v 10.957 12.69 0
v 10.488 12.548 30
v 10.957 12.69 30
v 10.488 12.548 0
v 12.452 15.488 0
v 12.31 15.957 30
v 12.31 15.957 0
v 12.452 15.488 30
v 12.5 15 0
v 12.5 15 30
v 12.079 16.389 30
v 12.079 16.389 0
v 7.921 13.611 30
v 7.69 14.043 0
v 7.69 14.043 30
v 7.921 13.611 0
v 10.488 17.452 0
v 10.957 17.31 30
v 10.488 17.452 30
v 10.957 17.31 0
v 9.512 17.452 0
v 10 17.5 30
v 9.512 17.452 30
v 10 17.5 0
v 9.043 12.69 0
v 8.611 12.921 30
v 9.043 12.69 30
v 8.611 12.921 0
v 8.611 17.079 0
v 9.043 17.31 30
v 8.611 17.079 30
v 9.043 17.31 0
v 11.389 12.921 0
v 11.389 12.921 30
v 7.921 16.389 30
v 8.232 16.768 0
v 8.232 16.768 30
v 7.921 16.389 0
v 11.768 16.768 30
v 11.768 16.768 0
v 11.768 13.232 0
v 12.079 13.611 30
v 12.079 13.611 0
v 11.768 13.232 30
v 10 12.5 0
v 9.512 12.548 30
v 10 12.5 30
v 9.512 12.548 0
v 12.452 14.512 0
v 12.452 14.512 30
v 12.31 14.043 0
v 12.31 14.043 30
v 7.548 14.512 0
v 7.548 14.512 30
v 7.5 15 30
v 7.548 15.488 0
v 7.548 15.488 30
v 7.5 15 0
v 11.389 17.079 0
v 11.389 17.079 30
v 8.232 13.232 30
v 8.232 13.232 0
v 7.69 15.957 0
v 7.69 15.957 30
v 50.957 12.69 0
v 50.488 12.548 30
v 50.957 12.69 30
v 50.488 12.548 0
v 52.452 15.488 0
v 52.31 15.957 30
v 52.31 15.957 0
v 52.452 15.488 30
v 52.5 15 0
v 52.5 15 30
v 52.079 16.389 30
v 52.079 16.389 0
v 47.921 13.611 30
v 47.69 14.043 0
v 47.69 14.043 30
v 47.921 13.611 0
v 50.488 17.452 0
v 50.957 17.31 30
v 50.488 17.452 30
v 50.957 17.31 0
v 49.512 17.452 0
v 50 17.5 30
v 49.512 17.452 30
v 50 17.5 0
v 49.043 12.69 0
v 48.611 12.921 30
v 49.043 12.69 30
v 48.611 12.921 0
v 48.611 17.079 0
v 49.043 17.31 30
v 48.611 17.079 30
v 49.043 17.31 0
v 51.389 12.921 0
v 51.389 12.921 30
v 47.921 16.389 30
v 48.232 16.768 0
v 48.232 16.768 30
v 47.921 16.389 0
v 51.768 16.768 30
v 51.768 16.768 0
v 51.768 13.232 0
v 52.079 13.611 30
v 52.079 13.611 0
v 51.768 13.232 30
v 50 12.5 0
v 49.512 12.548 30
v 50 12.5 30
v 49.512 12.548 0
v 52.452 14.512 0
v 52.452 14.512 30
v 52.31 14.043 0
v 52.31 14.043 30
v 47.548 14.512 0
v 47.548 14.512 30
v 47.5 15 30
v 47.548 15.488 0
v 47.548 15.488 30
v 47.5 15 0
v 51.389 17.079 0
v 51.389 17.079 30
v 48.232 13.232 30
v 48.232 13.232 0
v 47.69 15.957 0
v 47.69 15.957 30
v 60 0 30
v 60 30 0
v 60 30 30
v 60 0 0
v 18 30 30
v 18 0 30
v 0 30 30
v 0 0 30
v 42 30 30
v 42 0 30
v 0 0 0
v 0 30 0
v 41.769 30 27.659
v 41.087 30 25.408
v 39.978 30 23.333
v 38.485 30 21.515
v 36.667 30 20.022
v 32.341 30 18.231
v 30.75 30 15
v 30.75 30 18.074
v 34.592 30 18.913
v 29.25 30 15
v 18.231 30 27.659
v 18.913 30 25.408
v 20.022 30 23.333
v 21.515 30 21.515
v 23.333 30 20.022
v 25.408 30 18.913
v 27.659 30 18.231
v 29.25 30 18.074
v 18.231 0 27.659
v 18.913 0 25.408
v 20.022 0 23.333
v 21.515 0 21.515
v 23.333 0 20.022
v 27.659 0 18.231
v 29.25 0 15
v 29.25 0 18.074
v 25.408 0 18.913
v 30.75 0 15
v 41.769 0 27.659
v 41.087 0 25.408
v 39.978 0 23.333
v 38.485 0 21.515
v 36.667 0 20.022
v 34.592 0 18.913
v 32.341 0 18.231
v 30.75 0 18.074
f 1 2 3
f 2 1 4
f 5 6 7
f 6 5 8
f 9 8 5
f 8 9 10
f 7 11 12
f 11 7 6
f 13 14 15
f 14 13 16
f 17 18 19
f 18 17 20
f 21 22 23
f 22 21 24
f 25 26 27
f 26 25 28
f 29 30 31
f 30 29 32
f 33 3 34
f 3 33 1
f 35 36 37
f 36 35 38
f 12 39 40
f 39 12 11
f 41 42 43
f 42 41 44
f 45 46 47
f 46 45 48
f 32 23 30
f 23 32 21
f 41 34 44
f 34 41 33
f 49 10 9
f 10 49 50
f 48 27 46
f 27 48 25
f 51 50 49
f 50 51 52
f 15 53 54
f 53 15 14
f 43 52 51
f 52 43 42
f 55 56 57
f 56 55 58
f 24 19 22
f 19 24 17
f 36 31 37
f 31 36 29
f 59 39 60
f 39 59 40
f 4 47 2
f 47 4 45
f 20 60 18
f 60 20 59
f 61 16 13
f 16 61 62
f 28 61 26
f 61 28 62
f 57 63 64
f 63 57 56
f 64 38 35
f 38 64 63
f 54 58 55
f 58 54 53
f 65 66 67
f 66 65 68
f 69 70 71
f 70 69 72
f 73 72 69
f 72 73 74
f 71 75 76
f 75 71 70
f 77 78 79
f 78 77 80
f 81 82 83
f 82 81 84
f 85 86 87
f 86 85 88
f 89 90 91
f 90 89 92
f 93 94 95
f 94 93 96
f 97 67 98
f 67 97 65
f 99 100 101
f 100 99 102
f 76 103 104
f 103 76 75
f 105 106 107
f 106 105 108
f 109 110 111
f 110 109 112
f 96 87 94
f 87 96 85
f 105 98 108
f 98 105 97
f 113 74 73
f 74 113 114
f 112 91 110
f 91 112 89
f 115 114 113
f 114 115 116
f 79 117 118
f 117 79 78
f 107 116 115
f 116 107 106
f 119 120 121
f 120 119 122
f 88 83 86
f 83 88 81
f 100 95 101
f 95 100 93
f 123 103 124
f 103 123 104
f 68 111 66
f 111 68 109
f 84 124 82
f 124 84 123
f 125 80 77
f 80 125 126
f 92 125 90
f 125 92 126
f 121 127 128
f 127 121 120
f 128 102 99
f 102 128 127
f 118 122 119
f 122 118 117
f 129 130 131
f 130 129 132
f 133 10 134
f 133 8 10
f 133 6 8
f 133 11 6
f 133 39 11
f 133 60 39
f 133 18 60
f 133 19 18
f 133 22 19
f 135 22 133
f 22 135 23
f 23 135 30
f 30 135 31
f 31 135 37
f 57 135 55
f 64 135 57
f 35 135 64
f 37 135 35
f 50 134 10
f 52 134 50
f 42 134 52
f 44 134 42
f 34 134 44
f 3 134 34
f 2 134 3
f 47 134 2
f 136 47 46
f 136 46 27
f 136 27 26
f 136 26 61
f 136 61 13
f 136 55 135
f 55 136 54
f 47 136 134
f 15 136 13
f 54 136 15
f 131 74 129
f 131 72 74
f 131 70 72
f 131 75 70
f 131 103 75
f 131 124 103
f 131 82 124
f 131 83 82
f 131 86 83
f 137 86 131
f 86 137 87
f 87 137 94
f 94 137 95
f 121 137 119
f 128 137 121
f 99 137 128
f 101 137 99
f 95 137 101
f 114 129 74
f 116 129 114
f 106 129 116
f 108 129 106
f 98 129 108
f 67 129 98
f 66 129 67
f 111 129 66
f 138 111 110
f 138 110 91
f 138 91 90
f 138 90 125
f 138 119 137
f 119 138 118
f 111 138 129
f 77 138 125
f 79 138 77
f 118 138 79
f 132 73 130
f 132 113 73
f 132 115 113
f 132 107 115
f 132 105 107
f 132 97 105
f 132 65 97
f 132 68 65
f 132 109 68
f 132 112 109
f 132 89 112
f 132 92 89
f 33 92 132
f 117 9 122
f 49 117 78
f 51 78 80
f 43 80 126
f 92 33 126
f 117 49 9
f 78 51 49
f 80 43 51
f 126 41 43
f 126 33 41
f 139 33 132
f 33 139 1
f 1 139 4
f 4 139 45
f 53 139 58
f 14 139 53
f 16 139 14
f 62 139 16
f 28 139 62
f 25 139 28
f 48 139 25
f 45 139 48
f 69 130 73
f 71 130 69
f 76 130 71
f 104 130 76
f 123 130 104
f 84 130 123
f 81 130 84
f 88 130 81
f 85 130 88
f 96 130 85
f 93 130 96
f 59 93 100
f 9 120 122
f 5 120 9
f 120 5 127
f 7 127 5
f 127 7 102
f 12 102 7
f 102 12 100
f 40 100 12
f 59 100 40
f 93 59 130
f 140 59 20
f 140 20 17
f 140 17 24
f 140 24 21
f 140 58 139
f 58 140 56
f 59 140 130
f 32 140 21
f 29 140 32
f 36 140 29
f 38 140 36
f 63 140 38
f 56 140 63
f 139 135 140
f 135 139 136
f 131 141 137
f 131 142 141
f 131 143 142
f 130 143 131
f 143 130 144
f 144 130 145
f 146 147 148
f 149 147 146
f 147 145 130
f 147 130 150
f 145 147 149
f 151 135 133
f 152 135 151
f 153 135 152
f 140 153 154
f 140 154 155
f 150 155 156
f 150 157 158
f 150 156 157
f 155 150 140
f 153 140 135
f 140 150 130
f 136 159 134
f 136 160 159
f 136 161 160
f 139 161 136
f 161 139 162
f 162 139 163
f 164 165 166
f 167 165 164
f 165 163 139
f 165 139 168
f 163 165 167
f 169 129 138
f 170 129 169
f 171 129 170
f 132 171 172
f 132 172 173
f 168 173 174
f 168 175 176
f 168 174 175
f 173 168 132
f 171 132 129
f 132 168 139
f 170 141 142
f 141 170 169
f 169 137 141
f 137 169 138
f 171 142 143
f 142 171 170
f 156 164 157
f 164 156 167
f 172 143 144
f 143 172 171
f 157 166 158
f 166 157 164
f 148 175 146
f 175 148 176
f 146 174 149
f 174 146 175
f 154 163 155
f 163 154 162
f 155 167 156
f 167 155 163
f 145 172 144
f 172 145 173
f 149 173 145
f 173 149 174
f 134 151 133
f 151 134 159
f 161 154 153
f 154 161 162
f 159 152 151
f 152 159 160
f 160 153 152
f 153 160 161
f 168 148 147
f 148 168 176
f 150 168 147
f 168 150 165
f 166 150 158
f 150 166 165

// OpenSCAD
$fn = 32;

// ----------------------------------------------------------------------
// Saddle clamp: split shaft clamp
// ----------------------------------------------------------------------

// --- parameters (mm) ---
blk_l = 60;               // block length, X
blk_w = 30;               // block width, Y
blk_h = 30;               // block height
clamp_r = 12;             // shaft groove radius
hole_r = 2.5;             // bolt hole radius
hole_m = 10;              // bolt hole margin from the ends
saw_w = 1.5;              // saw kerf width

saw_depth = clamp_r + 3;  // saw kerf depth

difference() {
  cube([blk_l, blk_w, blk_h]);
  translate([blk_l / 2, -1, blk_h])
    rotate([-90, 0, 0])
      cylinder(h = blk_w + 2, r = clamp_r);
  for (sx = [0, 1])
    translate([sx ? blk_l - hole_m : hole_m, blk_w / 2, -1])
      cylinder(r = hole_r, h = blk_h + 2);
  translate([blk_l / 2 - saw_w / 2, -1, blk_h - saw_depth])
    cube([saw_w, blk_w + 2, saw_depth + 1]);
}
